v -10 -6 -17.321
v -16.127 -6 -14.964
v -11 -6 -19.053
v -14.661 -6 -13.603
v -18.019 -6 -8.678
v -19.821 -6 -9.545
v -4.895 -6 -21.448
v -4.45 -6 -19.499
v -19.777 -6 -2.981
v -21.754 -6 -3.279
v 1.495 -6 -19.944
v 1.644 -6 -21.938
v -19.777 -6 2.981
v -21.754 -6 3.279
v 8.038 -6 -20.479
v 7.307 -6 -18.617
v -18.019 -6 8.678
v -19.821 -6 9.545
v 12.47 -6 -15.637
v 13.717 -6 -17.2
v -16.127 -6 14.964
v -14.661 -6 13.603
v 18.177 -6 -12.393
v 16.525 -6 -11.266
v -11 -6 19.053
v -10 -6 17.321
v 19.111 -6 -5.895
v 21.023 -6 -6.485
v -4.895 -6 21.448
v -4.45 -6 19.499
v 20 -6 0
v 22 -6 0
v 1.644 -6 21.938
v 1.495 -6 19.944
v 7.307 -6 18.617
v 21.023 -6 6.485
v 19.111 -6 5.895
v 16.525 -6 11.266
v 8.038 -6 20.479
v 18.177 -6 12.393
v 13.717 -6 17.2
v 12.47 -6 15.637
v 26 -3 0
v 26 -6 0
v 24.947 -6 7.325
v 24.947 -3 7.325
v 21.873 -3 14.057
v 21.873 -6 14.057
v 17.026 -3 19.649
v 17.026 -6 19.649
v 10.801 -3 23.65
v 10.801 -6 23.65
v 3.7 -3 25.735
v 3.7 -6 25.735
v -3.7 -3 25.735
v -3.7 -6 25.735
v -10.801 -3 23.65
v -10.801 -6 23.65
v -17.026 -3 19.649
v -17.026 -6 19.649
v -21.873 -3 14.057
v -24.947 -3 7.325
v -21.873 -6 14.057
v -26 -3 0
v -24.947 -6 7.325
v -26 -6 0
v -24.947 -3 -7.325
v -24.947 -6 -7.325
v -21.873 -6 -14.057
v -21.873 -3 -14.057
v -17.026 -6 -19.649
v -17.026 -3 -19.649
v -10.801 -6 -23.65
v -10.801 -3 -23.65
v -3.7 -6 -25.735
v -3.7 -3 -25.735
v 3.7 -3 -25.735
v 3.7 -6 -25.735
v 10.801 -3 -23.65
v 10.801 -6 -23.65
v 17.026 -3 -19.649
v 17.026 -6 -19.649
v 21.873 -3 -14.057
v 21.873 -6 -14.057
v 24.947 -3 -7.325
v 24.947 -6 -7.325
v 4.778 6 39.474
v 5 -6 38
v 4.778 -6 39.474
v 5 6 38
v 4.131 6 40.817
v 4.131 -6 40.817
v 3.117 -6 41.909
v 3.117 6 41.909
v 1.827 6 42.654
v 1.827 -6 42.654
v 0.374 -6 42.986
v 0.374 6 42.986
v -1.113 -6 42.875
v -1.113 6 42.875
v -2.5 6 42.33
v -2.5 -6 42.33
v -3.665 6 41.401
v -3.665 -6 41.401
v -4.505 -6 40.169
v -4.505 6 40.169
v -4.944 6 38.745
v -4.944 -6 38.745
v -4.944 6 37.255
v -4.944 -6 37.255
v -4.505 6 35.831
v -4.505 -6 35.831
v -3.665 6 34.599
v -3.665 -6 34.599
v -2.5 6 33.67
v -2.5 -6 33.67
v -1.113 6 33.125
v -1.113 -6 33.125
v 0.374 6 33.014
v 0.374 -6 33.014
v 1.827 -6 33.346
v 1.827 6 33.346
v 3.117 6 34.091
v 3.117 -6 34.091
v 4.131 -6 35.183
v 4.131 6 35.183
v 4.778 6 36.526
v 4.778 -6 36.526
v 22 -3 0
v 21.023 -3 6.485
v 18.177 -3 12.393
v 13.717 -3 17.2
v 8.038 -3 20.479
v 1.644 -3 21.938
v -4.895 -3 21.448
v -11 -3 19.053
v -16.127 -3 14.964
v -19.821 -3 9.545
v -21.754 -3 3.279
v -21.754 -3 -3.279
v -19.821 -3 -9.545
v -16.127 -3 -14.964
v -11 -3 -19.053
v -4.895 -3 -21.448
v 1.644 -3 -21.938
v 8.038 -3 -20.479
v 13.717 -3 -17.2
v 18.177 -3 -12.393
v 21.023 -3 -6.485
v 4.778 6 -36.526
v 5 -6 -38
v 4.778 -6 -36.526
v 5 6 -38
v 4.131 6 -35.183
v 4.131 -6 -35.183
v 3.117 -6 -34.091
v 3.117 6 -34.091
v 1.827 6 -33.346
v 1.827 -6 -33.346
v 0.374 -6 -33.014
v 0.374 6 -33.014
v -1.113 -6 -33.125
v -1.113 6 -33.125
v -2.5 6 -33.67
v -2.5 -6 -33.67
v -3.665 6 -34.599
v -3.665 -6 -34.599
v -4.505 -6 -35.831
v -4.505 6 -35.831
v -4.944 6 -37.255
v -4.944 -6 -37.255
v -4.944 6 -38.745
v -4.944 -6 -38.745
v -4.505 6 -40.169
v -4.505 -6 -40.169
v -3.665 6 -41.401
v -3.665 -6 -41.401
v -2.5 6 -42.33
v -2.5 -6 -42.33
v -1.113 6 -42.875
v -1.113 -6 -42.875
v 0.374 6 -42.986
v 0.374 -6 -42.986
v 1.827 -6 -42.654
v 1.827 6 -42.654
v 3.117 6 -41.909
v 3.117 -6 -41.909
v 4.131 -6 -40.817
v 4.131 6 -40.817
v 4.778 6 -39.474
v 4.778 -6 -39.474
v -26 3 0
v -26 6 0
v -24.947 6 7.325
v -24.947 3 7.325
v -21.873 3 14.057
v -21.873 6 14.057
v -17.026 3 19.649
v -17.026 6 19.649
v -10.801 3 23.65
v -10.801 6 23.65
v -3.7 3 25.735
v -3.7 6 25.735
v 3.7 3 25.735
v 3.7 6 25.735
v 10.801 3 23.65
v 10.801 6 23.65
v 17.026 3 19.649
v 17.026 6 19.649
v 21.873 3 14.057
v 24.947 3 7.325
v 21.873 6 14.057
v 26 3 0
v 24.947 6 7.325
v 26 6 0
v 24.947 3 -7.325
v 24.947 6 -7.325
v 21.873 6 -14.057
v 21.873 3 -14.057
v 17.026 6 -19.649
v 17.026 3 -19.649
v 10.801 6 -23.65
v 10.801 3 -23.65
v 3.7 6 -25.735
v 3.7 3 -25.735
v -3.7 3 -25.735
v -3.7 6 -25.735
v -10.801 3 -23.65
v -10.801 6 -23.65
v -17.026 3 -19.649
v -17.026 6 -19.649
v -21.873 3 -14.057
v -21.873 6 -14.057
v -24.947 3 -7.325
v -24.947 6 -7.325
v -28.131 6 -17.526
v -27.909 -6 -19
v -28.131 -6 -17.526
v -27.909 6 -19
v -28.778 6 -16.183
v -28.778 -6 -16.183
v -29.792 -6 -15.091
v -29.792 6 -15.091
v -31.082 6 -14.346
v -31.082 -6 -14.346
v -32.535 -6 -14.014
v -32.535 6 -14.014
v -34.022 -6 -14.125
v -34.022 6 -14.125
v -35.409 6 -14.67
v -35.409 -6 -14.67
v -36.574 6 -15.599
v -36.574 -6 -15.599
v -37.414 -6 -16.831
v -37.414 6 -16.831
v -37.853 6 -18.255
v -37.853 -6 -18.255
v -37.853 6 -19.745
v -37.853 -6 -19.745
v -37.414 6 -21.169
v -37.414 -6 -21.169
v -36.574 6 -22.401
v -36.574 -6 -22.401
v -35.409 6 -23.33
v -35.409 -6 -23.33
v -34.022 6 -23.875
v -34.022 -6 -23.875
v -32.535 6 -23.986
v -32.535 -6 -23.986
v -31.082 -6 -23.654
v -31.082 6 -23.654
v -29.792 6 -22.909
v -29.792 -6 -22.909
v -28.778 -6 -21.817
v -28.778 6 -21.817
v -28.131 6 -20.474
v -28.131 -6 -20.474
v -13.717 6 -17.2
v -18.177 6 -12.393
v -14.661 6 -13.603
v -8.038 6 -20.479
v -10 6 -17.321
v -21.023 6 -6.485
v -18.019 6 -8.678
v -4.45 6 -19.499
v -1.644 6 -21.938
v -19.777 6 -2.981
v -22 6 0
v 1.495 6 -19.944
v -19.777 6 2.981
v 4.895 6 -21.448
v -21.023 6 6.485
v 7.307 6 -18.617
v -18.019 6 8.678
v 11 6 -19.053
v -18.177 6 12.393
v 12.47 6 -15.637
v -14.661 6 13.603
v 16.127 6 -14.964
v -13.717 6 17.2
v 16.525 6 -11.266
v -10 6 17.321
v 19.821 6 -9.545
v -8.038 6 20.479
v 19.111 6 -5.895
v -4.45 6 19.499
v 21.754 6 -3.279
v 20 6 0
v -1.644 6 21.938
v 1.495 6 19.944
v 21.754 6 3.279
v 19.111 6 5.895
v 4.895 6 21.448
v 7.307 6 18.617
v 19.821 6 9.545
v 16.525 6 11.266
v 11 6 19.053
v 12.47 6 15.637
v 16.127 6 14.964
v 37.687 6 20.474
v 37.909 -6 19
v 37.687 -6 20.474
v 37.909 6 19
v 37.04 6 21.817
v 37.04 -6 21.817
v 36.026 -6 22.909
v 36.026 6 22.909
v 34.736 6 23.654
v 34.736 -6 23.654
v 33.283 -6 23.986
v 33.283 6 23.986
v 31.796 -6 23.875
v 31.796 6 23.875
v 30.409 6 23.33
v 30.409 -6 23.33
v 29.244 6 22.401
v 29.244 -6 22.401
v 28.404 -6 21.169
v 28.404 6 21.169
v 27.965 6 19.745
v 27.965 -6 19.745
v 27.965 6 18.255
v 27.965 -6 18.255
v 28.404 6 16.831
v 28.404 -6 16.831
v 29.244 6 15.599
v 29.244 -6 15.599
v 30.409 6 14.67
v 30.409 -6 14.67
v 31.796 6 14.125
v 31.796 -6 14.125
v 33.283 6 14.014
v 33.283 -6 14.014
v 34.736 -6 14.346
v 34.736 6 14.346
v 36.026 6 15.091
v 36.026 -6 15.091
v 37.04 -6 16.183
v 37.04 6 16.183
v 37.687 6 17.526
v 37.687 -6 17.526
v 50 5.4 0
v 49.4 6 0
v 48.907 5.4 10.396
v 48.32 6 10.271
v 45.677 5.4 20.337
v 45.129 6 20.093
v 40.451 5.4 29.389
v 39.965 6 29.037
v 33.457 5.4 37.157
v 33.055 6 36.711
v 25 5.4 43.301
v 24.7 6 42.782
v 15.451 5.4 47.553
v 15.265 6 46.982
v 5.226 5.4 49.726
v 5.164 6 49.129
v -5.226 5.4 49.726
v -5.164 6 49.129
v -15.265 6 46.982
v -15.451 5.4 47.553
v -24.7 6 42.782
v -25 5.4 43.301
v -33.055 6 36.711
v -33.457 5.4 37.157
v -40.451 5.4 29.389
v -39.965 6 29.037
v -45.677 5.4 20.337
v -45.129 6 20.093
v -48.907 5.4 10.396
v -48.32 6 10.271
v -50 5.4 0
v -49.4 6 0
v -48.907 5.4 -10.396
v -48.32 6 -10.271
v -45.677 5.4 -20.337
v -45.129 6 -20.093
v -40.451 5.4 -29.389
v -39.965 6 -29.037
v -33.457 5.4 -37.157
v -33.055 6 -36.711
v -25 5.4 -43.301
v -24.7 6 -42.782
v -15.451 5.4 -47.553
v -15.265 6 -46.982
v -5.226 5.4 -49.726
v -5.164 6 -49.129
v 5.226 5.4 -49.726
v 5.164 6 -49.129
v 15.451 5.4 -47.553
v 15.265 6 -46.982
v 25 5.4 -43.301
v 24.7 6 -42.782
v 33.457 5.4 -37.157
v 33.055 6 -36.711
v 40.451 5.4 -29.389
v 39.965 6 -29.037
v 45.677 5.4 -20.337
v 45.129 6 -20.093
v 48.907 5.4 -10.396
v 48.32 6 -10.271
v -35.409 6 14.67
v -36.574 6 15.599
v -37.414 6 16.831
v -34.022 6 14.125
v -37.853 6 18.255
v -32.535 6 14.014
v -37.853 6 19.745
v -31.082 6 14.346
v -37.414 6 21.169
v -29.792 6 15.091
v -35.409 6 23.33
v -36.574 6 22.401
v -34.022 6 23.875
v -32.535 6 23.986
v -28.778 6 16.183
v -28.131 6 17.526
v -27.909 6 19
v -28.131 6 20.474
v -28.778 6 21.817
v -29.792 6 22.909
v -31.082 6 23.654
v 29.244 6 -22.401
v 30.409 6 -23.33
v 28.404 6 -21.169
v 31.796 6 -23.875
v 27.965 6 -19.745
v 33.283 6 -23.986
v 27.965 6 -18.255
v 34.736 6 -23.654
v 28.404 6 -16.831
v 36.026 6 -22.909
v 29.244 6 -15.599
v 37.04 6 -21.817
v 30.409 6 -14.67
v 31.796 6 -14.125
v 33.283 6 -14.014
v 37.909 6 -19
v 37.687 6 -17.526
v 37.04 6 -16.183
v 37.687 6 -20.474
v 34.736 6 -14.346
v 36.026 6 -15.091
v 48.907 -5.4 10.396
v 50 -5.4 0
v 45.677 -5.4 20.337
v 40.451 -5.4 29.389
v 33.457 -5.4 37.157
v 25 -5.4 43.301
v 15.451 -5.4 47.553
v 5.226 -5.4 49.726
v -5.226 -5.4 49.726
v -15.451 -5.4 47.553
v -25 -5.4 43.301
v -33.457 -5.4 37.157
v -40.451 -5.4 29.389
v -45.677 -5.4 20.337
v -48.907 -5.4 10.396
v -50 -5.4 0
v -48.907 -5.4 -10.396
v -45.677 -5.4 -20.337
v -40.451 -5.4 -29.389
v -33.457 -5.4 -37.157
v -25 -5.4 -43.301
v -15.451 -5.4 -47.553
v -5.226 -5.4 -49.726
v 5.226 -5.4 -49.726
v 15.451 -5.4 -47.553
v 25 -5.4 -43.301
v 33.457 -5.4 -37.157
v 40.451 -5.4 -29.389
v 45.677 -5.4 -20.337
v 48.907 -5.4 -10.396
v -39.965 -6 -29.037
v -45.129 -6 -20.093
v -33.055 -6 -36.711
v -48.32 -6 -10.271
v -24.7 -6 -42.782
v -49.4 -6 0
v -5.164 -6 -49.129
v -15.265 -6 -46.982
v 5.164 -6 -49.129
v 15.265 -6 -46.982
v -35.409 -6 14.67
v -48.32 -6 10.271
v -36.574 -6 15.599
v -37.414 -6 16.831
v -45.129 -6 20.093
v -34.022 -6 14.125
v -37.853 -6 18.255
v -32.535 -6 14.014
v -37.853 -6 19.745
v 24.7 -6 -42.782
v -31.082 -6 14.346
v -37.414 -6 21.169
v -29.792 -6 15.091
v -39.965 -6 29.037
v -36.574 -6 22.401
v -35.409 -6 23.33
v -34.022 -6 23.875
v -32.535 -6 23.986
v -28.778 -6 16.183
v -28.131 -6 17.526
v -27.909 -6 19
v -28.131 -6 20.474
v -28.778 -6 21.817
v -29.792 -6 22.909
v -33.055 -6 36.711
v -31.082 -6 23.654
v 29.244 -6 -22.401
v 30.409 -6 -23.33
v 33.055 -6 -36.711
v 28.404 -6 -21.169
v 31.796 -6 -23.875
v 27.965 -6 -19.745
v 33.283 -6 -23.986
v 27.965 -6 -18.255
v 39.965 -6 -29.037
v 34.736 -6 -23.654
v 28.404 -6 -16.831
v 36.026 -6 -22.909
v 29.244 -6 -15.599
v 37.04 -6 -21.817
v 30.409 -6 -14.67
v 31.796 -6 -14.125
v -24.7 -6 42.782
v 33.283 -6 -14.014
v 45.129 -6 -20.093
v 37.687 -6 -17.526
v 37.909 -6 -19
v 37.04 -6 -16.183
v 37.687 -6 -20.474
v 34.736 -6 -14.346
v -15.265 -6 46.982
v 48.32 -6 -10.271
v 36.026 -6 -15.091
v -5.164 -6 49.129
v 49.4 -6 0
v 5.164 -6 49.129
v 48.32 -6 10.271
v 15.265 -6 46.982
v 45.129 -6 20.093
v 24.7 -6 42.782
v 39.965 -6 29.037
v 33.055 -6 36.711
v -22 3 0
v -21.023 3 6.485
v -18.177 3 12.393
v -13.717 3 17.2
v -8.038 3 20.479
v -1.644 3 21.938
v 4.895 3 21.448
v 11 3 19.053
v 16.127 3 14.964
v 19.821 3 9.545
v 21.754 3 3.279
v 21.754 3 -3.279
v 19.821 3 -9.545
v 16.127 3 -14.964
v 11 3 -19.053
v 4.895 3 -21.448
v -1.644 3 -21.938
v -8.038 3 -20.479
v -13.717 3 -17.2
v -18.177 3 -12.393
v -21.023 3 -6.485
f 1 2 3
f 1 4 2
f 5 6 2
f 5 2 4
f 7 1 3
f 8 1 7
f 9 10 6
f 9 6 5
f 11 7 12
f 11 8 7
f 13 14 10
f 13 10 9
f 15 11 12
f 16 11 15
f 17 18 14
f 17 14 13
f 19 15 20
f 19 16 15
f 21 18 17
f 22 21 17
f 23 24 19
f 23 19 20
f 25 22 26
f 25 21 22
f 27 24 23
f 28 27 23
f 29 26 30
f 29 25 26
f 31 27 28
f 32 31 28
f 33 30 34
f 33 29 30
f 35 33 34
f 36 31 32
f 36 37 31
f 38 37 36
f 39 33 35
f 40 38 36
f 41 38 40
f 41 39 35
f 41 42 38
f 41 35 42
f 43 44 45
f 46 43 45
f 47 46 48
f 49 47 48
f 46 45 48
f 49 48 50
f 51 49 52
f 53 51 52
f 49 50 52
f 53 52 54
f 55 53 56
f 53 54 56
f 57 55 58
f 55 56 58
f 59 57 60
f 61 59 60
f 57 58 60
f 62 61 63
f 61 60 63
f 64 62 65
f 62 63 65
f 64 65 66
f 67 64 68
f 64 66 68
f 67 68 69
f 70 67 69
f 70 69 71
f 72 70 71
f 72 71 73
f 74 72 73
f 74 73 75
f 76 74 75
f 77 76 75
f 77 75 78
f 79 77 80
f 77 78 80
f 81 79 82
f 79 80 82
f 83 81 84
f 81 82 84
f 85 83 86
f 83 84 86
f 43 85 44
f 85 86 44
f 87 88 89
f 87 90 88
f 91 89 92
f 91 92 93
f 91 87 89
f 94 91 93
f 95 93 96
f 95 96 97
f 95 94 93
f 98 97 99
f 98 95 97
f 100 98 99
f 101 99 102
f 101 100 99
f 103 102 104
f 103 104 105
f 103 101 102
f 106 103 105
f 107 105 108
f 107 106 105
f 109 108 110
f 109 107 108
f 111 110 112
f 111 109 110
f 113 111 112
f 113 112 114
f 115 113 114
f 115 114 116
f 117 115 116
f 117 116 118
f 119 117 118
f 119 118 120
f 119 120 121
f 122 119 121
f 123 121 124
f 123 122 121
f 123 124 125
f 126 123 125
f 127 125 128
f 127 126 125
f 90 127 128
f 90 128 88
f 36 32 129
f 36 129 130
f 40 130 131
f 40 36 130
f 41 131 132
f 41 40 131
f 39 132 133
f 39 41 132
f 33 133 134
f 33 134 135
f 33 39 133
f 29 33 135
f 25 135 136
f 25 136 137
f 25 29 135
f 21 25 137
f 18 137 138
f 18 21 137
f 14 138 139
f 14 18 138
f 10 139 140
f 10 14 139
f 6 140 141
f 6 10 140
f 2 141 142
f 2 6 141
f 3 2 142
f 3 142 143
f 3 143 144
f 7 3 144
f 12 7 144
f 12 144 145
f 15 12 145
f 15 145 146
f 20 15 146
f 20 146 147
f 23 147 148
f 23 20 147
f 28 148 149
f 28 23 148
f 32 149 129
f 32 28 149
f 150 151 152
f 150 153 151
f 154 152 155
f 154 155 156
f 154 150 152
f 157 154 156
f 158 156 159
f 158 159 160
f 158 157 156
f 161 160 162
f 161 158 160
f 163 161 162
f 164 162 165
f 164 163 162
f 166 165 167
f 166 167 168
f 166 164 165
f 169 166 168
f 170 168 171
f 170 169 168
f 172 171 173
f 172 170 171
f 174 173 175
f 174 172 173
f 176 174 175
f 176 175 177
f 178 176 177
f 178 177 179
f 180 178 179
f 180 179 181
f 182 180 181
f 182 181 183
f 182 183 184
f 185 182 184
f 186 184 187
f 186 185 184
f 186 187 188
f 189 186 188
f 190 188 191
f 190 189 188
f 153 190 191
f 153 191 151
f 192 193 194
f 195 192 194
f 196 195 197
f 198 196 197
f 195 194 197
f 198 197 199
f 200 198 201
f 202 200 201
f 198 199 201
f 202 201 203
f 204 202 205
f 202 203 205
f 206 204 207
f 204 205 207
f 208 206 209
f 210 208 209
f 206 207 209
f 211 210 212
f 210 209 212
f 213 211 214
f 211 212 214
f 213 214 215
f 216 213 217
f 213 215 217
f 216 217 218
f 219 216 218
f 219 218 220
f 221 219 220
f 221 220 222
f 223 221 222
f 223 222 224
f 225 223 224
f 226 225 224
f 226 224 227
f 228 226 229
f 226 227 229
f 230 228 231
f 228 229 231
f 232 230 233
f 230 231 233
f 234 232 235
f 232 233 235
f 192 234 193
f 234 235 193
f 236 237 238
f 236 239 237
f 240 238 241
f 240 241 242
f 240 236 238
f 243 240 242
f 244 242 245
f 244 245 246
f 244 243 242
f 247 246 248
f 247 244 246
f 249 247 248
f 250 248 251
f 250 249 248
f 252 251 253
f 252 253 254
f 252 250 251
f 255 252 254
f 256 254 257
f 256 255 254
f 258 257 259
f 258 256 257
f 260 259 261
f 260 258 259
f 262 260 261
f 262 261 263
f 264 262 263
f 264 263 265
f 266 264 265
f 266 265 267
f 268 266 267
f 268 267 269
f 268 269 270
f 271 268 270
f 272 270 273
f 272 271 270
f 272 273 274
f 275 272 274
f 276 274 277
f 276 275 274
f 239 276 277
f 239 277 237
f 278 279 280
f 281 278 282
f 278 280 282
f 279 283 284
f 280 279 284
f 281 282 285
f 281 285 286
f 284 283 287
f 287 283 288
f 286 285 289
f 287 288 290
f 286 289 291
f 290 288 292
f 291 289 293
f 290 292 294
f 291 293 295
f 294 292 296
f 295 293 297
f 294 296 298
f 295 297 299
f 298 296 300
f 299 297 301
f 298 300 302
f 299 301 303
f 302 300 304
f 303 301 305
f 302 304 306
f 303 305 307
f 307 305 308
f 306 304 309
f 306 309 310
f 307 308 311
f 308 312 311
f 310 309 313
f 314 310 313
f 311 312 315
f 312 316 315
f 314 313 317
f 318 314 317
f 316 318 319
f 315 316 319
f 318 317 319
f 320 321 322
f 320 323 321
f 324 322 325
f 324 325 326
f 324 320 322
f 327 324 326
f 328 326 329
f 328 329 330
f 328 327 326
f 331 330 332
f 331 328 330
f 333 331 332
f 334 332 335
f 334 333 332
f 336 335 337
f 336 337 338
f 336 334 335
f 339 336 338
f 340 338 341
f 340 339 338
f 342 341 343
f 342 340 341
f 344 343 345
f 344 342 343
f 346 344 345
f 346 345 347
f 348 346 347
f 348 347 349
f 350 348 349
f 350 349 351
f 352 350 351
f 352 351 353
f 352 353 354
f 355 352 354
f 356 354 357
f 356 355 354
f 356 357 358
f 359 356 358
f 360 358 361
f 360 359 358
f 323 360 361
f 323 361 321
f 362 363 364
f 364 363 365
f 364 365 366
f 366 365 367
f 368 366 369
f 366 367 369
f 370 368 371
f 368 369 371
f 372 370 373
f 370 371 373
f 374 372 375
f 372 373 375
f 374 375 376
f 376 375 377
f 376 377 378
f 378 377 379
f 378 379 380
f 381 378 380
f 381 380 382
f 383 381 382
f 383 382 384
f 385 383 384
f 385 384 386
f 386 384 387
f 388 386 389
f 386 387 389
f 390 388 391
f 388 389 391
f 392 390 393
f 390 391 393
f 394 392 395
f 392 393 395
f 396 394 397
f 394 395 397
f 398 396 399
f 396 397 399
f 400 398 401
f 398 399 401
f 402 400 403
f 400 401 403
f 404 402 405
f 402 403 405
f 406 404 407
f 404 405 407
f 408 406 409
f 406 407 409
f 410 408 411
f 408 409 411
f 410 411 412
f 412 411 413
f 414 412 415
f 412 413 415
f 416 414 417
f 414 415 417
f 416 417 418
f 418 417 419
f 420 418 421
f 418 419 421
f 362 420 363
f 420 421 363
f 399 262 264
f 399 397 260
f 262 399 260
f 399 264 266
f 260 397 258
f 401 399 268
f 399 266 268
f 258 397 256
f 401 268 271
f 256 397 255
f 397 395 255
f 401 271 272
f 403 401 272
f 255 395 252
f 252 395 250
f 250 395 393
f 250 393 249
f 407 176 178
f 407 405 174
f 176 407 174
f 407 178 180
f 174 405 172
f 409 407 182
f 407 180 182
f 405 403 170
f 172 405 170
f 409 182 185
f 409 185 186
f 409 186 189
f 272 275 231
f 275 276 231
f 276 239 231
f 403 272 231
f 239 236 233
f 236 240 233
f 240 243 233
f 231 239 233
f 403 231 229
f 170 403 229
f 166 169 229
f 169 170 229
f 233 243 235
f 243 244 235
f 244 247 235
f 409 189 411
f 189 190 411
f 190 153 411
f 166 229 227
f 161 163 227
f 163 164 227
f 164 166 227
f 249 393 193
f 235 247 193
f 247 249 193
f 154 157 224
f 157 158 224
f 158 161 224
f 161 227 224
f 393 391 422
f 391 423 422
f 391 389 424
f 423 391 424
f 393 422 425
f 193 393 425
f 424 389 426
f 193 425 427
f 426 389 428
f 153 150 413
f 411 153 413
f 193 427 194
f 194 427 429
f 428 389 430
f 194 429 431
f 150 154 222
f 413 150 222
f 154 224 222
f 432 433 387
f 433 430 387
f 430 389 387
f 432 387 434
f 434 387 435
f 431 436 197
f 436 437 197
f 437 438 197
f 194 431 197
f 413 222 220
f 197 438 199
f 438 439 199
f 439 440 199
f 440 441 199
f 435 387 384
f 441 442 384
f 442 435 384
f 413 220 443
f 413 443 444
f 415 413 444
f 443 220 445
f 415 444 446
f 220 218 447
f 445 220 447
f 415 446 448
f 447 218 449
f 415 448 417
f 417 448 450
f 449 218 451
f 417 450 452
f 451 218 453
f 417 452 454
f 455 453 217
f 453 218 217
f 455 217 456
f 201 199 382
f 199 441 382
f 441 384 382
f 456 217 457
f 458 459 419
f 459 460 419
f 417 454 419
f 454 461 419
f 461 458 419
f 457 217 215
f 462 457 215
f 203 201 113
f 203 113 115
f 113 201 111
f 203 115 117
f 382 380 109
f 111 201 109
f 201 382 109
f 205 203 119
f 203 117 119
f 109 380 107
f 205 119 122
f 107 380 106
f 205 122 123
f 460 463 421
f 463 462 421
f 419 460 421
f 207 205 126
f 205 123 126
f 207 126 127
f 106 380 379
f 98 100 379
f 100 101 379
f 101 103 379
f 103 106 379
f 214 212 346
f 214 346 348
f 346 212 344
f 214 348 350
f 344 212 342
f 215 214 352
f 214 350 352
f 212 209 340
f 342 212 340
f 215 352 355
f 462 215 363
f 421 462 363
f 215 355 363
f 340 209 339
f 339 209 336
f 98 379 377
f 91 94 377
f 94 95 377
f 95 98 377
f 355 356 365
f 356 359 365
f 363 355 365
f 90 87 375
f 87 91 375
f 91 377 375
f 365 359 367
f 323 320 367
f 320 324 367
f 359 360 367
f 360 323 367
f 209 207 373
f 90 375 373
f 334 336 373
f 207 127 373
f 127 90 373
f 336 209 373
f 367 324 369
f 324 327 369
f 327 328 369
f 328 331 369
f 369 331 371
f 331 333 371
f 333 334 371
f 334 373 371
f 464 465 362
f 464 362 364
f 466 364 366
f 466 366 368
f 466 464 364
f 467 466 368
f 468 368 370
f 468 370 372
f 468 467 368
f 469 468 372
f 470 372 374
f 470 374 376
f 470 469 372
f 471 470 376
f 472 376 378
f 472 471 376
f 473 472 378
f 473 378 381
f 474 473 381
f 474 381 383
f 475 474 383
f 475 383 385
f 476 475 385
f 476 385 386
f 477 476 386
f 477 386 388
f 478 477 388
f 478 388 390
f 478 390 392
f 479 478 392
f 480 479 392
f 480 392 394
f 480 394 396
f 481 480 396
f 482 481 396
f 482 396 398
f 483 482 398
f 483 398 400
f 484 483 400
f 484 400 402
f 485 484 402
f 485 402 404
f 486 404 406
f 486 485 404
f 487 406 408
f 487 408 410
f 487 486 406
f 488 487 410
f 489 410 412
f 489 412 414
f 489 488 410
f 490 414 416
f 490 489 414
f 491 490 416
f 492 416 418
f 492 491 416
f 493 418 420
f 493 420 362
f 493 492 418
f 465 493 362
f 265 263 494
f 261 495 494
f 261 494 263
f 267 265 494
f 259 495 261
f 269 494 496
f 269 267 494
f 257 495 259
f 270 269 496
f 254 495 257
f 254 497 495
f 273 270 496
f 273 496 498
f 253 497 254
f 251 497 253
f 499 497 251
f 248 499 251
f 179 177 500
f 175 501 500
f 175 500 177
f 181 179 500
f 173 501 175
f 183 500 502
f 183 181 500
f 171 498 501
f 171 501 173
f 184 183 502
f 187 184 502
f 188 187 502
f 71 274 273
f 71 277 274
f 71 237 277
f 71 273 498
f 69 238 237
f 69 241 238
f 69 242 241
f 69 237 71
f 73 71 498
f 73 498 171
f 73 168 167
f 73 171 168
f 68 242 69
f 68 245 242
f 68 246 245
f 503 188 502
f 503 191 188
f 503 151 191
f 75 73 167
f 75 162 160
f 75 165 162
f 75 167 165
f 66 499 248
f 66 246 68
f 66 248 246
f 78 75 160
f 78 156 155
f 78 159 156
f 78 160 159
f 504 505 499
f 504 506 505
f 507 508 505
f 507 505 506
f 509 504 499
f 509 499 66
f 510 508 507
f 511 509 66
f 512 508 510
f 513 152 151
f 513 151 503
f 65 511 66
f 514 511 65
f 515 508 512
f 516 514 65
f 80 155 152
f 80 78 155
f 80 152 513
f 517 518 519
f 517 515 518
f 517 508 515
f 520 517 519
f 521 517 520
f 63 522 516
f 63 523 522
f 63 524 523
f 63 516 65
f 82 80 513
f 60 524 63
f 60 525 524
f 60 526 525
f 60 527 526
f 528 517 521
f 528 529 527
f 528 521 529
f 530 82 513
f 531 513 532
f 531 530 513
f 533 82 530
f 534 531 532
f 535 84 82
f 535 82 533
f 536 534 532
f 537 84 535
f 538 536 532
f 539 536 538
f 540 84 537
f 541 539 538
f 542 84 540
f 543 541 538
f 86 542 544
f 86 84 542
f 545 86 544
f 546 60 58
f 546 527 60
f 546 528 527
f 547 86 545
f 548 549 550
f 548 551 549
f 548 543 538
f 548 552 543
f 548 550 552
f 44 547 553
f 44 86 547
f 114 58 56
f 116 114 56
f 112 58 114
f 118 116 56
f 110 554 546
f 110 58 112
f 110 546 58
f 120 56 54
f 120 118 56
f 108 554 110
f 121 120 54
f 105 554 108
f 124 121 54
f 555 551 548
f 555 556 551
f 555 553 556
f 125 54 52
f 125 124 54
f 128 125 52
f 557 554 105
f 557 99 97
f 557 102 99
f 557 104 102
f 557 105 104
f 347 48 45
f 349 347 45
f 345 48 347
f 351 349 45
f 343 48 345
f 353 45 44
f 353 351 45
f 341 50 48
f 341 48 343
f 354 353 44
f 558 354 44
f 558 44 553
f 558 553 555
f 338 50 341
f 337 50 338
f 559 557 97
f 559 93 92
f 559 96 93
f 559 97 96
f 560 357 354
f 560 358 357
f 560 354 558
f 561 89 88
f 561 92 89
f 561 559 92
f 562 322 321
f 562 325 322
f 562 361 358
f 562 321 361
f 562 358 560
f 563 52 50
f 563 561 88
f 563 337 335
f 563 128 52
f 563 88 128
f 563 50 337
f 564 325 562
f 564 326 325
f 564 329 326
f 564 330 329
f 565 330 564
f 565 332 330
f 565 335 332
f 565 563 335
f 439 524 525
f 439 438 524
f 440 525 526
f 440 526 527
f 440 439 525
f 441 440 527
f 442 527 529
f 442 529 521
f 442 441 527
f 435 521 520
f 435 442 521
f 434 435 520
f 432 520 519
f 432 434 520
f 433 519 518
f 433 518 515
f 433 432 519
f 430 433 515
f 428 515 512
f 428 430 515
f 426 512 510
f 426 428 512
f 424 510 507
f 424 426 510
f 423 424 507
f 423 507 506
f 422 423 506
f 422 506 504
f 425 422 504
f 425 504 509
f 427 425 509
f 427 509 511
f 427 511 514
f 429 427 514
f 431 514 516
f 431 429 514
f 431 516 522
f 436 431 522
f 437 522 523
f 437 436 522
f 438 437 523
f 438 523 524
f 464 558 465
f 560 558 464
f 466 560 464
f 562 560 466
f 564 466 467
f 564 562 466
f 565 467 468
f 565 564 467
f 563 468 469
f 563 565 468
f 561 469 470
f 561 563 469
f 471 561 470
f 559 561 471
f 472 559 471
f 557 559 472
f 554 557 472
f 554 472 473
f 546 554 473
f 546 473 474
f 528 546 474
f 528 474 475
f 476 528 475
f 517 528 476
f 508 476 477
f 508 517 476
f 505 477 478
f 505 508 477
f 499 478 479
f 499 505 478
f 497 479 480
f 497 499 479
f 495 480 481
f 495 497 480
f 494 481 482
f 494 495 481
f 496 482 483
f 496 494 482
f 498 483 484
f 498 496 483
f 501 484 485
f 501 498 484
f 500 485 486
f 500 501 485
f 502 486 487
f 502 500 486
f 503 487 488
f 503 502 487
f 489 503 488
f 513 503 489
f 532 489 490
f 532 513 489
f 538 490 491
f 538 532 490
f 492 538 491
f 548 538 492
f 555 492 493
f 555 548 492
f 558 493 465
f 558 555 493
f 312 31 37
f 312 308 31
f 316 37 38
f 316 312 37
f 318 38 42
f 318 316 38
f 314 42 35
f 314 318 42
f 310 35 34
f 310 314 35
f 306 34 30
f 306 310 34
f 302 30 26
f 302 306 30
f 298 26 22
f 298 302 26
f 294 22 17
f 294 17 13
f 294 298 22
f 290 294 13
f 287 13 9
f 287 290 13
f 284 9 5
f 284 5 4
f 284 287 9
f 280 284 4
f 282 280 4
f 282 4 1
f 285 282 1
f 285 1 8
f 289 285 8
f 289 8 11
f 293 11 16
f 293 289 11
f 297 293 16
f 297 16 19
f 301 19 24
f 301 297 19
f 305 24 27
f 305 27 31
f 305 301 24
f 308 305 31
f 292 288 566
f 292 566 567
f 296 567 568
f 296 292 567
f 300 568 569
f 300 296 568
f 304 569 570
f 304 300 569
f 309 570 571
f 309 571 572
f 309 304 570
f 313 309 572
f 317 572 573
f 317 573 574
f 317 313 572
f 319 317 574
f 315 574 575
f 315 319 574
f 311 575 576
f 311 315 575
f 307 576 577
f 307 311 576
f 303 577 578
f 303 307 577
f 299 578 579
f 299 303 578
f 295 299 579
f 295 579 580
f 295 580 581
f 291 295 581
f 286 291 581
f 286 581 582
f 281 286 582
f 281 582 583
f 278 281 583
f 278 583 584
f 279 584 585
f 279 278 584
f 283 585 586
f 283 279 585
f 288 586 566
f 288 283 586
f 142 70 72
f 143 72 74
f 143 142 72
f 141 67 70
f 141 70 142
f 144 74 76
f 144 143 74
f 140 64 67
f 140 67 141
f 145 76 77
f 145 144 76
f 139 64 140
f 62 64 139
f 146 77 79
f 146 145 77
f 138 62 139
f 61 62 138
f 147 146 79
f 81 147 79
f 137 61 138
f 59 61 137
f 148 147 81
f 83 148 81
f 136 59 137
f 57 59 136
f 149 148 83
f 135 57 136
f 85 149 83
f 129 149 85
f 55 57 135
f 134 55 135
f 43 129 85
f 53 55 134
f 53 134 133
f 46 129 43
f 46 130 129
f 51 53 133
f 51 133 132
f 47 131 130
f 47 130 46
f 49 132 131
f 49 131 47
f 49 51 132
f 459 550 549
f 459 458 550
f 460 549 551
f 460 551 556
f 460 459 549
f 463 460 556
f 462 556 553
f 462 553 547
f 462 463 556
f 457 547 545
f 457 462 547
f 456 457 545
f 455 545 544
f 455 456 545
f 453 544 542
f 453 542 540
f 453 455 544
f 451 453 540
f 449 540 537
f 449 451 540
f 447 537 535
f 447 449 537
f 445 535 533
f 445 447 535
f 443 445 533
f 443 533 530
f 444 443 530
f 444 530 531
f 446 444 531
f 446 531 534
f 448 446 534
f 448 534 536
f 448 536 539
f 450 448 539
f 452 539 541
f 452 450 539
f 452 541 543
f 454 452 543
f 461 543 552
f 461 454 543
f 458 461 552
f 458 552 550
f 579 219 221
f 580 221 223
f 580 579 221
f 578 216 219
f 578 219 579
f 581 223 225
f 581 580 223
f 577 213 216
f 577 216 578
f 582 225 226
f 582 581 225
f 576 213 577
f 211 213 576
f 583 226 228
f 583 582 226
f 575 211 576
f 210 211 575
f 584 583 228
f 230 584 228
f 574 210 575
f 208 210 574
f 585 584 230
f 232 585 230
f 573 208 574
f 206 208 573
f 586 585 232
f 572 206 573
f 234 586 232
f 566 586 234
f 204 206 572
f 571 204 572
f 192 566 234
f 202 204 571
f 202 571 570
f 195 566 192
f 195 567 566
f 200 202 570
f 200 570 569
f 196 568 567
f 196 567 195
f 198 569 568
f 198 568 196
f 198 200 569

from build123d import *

# Parameters (mm, degrees)
F0_R     = 50
F0_R_2   = 5
F0_R_3   = 26
F0_R_4   = 22
F0_R_5   = 20
F1_DEPTH = 6
F2_R     = 26
F2_R_2   = 22
F3_DEPTH = 3
F5_R     = 26
F5_R_2   = 22
F6_DEPTH = 3
F7_SIZE  = 0.6


with BuildPart() as f1:
    # F0 (on Front) → F1 (new body, symmetric)
    with BuildSketch(Plane.XZ):
        Circle(F0_R)
        with Locations((-32.9089653438, -19)):
            Circle(F0_R_2, mode=Mode.SUBTRACT)
        with Locations((0, -38)):
            Circle(F0_R_2, mode=Mode.SUBTRACT)
        with Locations((32.9089653438, -19)):
            Circle(F0_R_2, mode=Mode.SUBTRACT)
        with Locations((-32.9089653438, 19)):
            Circle(F0_R_2, mode=Mode.SUBTRACT)
        Circle(F0_R_3, mode=Mode.SUBTRACT)
        with Locations((32.9089653438, 19)):
            Circle(F0_R_2, mode=Mode.SUBTRACT)
        with Locations((0, 38)):
            Circle(F0_R_2, mode=Mode.SUBTRACT)
        Circle(F0_R_3)
        Circle(F0_R_4, mode=Mode.SUBTRACT)
        Circle(F0_R_4)
        Circle(F0_R_5, mode=Mode.SUBTRACT)
    extrude(amount=F1_DEPTH, both=True)

    # F2 (on face) → F3 (cut)
    with BuildSketch(Plane.XZ.offset(6)):
        Circle(F2_R)
        Circle(F2_R_2, mode=Mode.SUBTRACT)
    extrude(amount=-F3_DEPTH, mode=Mode.SUBTRACT)

    # F5 (on face) → F6 (cut)
    with BuildSketch(Plane(origin=(0, 6, 0), x_dir=(-1, 0, 0), z_dir=(0, 1, 0))):
        Circle(F5_R)
        Circle(F5_R_2, mode=Mode.SUBTRACT)
    extrude(amount=-F6_DEPTH, mode=Mode.SUBTRACT)

    # F7
    f7_edges = [f1.edges().sort_by_distance(p)[0] for p in [
        (-50, 6, 0),
        (50, 0, 0),
        (-50, -6, 0),
    ]]
    chamfer(f7_edges, length=F7_SIZE)


solid = f1.part
